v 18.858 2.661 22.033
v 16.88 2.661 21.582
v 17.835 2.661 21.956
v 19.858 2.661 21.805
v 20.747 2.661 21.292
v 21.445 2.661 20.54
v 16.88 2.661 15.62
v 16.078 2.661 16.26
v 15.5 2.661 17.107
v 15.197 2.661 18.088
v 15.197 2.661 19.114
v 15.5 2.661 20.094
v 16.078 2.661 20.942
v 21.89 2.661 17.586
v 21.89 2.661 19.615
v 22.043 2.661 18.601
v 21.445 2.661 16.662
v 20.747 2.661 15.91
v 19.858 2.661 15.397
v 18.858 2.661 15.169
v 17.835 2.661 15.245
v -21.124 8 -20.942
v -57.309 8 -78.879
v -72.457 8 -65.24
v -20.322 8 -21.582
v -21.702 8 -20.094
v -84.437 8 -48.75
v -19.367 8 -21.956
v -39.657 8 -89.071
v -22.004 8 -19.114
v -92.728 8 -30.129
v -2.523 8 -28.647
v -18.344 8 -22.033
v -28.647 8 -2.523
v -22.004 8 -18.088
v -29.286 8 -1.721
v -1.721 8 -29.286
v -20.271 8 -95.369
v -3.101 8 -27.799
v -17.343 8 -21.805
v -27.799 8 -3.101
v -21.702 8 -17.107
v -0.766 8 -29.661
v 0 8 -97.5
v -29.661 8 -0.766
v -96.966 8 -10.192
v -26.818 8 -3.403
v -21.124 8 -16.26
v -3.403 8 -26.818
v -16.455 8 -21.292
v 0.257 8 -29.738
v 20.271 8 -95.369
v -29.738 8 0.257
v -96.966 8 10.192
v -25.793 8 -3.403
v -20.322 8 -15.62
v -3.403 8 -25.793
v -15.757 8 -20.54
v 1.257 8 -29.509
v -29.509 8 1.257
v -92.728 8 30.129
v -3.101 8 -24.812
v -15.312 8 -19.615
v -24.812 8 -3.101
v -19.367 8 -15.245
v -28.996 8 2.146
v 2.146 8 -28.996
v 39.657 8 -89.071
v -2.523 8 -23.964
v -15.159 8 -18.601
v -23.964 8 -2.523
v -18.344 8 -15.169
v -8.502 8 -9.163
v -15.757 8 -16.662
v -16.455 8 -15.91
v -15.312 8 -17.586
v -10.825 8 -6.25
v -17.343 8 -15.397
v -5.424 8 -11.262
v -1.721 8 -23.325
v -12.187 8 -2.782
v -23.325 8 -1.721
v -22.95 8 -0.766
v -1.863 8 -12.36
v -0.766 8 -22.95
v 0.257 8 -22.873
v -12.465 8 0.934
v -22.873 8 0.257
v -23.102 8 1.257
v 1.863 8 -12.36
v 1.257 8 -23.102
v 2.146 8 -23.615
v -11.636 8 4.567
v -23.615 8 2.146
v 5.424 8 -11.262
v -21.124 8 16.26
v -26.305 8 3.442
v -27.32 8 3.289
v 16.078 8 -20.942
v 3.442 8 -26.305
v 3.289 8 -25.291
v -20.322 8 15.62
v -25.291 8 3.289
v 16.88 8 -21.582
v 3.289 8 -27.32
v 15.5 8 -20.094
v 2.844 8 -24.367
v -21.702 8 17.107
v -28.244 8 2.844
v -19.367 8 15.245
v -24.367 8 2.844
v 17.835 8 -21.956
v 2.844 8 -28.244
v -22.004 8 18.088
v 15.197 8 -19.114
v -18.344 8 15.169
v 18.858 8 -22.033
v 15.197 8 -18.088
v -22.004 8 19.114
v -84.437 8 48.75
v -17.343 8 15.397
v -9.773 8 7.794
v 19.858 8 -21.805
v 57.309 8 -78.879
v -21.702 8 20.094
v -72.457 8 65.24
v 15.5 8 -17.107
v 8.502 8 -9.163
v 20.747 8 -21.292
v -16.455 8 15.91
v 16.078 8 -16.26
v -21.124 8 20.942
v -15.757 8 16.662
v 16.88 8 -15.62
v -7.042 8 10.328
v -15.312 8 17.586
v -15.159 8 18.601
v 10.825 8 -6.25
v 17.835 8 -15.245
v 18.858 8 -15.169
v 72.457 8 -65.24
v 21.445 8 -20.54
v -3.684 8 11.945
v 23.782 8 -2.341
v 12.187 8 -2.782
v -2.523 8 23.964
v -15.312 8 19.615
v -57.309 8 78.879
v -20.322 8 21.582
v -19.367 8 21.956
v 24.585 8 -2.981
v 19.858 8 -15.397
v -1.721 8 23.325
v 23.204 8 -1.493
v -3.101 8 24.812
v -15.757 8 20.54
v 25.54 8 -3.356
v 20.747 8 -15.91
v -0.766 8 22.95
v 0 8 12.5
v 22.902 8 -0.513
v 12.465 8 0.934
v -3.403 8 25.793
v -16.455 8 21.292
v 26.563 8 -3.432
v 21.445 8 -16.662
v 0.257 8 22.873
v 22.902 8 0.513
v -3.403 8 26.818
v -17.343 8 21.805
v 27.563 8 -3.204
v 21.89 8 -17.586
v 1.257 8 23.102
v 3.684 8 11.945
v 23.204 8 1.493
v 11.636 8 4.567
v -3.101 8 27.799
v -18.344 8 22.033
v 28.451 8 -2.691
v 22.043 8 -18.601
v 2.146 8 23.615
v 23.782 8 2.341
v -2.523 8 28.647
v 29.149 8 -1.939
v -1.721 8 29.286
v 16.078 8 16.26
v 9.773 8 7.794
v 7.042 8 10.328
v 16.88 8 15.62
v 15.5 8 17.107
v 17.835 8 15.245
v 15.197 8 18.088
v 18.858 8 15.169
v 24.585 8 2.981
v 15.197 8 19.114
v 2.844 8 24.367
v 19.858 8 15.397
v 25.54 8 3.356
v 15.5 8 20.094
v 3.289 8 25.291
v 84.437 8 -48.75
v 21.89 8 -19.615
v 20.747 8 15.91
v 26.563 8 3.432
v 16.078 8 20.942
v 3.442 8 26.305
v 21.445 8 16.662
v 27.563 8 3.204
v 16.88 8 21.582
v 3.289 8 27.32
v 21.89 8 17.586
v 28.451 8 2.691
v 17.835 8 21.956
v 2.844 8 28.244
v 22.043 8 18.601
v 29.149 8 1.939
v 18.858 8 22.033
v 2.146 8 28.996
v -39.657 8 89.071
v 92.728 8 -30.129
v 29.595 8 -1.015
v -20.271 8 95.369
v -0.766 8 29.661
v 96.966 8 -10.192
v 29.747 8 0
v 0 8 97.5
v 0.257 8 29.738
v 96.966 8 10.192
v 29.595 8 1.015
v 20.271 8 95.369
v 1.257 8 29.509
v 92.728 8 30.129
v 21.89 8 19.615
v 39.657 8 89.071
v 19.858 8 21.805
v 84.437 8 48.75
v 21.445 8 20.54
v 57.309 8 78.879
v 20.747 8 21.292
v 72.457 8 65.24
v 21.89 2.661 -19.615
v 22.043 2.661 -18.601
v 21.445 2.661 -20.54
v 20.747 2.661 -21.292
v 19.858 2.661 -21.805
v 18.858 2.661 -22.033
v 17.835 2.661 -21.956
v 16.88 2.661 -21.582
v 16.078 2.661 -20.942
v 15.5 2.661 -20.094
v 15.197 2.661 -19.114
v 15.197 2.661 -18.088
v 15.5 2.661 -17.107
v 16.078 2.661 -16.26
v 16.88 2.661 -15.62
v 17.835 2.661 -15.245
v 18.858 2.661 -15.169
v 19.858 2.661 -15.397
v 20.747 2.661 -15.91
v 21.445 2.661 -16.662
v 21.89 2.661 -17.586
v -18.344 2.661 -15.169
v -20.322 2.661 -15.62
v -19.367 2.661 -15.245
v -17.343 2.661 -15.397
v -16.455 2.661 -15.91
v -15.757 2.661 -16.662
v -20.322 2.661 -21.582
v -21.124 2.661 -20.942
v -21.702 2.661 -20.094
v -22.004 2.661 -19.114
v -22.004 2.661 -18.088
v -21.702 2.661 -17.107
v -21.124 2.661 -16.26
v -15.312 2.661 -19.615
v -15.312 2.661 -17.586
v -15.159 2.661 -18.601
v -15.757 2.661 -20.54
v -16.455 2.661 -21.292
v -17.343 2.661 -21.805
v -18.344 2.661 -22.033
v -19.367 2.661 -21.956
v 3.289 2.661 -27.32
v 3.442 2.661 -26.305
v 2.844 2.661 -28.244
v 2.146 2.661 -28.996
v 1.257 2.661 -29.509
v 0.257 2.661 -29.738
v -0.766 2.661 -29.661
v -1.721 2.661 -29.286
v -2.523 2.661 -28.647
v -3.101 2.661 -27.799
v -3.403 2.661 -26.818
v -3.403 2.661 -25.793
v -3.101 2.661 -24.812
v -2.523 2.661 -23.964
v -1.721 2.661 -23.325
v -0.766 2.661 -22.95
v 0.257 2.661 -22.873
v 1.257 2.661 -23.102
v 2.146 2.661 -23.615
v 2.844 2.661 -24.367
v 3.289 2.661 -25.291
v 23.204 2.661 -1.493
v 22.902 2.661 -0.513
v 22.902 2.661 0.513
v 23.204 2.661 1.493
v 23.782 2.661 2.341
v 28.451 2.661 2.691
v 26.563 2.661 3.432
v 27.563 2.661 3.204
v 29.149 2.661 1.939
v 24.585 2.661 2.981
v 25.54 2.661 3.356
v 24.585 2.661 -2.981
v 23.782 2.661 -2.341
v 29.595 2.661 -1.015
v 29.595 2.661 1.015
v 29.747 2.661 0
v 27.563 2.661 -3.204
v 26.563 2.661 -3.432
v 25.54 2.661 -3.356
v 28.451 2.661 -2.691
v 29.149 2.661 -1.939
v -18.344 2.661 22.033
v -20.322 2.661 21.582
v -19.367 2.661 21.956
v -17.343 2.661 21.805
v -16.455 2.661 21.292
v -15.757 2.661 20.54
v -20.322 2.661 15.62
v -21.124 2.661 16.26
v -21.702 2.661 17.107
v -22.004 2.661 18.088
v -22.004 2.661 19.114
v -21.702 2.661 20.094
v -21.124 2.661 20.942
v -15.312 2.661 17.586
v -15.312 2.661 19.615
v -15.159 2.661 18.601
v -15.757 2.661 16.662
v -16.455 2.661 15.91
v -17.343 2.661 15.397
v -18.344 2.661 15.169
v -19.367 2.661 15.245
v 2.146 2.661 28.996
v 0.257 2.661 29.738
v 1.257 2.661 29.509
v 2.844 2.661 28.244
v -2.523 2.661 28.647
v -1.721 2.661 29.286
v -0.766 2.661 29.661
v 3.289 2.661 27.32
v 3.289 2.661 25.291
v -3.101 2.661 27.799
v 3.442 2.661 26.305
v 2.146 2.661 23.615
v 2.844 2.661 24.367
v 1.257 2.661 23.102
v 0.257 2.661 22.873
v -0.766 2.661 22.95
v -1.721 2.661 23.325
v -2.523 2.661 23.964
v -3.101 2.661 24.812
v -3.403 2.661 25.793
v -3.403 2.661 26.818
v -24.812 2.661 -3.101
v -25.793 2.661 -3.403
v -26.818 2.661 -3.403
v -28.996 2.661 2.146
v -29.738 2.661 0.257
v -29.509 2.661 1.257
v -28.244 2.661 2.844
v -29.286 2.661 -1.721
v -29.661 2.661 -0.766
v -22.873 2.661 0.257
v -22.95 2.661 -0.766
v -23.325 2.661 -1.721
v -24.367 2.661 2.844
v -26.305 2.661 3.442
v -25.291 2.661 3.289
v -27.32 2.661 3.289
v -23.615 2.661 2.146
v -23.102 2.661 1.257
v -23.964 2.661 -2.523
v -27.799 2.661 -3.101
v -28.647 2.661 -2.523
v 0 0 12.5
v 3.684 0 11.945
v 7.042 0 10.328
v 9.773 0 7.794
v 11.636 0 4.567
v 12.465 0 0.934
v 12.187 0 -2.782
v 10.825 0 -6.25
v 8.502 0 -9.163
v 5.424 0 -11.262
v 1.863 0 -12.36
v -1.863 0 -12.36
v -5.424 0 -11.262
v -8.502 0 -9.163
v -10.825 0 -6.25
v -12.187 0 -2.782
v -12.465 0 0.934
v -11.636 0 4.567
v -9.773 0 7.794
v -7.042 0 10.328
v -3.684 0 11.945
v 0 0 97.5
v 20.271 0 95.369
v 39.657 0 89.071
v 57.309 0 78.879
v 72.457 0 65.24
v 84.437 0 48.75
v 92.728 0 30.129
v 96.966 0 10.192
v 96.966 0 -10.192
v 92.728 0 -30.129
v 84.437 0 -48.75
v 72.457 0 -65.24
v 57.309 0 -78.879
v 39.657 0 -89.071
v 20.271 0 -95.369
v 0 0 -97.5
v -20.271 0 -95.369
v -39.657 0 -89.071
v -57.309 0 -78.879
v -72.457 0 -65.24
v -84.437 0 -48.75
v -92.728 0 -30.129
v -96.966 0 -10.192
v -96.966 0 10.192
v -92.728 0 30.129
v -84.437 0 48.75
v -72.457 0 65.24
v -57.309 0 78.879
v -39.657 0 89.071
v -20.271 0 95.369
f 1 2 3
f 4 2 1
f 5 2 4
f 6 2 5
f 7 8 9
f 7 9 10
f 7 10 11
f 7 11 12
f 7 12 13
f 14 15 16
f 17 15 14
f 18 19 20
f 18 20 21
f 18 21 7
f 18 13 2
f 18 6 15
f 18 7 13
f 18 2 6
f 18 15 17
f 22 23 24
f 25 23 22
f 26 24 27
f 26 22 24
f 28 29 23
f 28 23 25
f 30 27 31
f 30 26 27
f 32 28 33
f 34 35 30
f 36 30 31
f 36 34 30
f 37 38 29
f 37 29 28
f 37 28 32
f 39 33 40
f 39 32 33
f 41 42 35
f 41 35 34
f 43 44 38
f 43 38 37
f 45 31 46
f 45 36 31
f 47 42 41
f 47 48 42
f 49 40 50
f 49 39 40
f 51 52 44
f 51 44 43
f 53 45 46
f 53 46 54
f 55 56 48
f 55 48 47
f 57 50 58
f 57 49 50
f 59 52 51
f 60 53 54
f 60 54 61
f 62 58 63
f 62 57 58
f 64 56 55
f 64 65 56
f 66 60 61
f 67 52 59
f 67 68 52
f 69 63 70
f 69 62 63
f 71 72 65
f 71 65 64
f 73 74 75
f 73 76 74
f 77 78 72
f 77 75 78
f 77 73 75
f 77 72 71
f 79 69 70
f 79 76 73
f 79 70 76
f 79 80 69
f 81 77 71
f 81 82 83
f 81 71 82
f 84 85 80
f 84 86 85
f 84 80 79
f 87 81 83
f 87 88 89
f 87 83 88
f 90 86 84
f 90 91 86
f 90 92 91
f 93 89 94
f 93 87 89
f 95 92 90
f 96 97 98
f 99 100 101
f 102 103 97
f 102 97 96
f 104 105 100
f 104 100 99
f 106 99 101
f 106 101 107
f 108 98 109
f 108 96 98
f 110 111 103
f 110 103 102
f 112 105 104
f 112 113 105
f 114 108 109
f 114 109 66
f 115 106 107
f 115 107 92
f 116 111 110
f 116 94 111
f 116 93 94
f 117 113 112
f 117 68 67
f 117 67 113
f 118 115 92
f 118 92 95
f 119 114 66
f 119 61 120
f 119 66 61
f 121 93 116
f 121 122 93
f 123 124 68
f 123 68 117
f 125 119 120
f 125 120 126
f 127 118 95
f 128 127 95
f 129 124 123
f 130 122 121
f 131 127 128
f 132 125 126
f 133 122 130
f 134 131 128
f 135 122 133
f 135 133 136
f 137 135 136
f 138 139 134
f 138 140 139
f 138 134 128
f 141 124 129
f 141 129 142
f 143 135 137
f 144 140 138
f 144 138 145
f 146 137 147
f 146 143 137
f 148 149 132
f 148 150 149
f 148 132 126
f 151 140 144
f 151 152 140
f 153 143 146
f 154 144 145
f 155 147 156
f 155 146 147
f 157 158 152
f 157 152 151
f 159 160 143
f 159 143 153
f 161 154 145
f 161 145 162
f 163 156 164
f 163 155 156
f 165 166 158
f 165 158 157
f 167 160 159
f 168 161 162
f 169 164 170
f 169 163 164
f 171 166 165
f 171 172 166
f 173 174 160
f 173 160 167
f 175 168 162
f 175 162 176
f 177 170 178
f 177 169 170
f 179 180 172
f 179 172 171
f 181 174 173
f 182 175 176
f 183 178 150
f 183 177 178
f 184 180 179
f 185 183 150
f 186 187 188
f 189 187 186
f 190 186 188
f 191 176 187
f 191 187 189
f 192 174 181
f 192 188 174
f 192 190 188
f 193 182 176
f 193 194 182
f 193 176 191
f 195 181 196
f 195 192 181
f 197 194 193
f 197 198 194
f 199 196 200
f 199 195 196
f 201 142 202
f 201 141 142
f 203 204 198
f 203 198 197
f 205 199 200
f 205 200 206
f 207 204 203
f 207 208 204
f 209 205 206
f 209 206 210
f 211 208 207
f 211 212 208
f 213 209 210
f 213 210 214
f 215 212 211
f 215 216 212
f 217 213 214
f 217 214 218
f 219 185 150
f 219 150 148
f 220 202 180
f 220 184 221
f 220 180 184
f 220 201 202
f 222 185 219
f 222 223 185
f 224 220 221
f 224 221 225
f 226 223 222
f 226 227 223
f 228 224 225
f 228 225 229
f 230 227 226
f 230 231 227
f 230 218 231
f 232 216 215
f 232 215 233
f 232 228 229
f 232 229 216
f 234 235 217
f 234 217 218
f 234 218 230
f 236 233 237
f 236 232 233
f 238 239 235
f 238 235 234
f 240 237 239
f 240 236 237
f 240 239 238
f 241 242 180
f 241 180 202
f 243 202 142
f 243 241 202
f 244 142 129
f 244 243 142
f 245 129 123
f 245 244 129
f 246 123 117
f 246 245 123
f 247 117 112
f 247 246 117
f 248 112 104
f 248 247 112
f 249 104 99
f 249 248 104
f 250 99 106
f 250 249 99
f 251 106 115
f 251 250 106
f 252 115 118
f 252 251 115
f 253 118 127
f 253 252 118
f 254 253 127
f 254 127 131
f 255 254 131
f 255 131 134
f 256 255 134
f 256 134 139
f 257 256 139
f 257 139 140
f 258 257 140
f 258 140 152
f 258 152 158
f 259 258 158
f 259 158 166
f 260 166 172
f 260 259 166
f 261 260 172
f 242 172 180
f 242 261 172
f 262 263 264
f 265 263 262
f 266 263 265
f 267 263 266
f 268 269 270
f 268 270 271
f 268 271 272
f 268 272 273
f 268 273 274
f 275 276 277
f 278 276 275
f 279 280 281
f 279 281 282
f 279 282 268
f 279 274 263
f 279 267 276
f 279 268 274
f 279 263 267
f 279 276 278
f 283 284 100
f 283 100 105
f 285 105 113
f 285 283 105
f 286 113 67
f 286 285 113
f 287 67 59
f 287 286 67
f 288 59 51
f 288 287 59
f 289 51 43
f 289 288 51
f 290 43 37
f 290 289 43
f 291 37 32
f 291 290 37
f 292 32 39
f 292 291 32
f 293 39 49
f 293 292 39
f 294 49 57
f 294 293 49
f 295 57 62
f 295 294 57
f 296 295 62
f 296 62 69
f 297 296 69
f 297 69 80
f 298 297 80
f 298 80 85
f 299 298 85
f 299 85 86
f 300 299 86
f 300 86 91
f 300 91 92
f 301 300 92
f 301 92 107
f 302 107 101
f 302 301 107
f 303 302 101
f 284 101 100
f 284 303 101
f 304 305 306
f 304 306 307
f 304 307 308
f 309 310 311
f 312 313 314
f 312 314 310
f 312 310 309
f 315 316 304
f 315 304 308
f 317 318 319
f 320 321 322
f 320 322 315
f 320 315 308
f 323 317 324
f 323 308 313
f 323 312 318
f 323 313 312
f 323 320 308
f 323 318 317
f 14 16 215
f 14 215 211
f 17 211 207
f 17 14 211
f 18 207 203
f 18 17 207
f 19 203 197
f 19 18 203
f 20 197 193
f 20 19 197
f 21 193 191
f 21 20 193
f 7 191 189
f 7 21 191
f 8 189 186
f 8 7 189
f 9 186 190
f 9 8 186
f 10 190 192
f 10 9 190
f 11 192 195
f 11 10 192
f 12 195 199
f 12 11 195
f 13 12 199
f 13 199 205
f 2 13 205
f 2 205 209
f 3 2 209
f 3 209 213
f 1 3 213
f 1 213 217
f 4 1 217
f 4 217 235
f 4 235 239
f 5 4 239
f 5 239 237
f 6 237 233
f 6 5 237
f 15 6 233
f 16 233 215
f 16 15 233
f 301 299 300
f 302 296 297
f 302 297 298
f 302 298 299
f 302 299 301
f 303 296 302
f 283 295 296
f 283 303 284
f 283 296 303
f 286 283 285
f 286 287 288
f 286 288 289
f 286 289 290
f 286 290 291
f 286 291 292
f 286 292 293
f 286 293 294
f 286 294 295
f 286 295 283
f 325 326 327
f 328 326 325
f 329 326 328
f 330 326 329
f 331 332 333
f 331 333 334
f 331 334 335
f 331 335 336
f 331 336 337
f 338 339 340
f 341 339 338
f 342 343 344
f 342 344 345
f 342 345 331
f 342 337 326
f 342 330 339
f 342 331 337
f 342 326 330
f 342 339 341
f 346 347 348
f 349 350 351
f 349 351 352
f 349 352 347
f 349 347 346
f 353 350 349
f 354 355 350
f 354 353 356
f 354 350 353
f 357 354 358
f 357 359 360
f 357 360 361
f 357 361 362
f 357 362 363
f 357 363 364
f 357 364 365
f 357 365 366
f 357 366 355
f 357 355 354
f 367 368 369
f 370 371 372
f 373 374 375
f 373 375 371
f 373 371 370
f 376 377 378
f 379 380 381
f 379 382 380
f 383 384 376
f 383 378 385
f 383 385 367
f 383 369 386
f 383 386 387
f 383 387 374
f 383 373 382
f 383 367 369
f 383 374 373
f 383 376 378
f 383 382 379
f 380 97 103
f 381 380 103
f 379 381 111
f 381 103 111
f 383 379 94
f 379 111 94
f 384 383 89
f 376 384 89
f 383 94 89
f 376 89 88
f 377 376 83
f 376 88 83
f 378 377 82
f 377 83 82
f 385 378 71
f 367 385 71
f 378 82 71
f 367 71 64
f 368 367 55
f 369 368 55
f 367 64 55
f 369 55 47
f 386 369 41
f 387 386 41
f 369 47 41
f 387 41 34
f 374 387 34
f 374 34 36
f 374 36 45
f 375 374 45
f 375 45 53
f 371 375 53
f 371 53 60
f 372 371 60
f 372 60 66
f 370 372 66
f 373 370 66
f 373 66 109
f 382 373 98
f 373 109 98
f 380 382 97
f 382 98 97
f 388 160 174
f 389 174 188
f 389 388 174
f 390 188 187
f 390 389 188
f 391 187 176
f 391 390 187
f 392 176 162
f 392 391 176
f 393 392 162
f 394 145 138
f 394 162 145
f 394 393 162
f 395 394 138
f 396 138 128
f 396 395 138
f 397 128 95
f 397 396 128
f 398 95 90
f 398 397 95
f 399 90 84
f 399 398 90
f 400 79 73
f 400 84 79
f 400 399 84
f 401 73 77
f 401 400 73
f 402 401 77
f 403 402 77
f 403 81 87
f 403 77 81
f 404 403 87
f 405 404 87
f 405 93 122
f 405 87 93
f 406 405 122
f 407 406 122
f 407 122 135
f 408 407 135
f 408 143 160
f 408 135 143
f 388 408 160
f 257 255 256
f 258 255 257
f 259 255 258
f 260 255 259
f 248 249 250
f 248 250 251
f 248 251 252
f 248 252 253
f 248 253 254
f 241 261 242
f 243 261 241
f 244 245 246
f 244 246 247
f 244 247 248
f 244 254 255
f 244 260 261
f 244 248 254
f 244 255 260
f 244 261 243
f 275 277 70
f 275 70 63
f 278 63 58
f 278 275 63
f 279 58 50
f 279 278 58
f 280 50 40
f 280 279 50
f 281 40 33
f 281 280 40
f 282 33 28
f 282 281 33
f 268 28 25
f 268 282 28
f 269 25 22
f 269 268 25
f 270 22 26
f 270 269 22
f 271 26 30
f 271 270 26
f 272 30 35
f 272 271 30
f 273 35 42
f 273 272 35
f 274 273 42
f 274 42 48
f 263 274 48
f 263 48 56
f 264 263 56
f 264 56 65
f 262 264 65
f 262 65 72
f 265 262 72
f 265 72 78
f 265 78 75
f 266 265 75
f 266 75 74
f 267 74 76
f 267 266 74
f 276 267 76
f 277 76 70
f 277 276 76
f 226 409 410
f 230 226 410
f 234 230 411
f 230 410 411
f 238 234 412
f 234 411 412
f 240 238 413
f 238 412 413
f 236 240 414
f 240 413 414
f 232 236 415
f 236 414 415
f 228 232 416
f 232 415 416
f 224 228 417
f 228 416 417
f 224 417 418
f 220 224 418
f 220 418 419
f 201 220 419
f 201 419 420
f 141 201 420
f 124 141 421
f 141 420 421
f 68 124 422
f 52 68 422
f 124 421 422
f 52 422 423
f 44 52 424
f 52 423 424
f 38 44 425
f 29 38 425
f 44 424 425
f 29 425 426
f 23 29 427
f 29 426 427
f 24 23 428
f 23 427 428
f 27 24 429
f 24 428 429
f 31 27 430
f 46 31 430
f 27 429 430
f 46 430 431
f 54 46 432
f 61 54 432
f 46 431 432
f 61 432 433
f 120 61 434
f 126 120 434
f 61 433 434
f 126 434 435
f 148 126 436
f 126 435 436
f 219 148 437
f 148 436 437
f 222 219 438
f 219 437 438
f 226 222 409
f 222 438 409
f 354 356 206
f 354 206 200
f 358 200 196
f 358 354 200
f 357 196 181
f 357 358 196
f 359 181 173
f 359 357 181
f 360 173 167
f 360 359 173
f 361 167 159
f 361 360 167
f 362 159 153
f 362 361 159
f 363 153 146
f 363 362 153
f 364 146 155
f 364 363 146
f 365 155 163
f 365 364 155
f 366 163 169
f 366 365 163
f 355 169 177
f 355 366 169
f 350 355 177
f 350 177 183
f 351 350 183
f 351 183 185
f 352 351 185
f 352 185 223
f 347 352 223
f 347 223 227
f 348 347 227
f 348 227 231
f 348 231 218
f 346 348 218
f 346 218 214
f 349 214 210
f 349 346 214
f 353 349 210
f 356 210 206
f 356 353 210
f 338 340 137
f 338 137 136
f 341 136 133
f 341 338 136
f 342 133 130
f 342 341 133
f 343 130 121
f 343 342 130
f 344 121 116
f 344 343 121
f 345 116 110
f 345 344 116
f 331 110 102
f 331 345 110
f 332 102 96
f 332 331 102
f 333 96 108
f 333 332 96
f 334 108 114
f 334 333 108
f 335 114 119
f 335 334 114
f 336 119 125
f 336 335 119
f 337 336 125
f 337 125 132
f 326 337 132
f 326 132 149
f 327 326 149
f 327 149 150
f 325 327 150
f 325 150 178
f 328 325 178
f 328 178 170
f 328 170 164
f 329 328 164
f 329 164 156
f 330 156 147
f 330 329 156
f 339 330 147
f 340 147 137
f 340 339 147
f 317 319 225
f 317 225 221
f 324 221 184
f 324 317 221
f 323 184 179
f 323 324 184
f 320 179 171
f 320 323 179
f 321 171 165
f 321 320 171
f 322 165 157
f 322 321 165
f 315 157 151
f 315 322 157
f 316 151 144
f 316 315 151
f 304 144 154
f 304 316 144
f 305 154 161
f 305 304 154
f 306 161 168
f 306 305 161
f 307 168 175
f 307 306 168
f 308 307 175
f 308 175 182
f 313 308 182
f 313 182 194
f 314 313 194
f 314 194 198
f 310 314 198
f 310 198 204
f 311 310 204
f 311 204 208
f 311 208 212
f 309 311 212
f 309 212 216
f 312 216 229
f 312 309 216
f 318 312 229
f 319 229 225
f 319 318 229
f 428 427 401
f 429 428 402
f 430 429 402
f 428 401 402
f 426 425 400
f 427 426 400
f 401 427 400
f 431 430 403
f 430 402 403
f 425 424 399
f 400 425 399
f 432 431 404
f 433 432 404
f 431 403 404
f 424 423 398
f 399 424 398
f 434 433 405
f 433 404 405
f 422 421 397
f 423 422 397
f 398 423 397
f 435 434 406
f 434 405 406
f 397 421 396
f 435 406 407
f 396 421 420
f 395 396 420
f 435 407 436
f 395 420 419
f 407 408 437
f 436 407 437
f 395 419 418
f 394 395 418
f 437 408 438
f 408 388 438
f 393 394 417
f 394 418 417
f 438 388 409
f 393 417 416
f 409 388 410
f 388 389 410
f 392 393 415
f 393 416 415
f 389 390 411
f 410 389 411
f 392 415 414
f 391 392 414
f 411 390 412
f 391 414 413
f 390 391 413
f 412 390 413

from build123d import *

# Parameters (mm, degrees)
SKETCH1_R           = 97.5
BOSS_EXTRUDE1_DEPTH = 8
SKETCH2_R           = 12.5
CUT_EXTRUDE1_DEPTH  = 139.117703427
SKETCH3_R           = 3.441916601
CUT_EXTRUDE2_DEPTH  = 5.339201693
CIRPATTERN1_COUNT   = 8


with BuildPart() as part:
    # Sketch1 → Boss-Extrude1 (new body)
    with BuildSketch(Plane(origin=(0, 0, 0), x_dir=(1, 0, 0), z_dir=(0, 1, 0))):
        Circle(SKETCH1_R)
    extrude(amount=BOSS_EXTRUDE1_DEPTH)

    # Sketch2 → Cut-Extrude1 (cut, through all)
    with BuildSketch(Plane(origin=(0, 0, 0), x_dir=(1, 0, 0), z_dir=(0, 1, 0))):
        Circle(SKETCH2_R)
    extrude(amount=CUT_EXTRUDE1_DEPTH, mode=Mode.SUBTRACT)

    # Sketch3 → Cut-Extrude2 (cut)
    with BuildSketch(Plane(origin=(0, 8, 0), x_dir=(1, 0, 0), z_dir=(0, 1, 0))):
        with Locations((-26.305499443, 0)):
            Circle(SKETCH3_R)
    cut_extrude2 = extrude(amount=-CUT_EXTRUDE2_DEPTH, mode=Mode.SUBTRACT)

    # CirPattern1: Cut-Extrude2 ×8 about axis
    cirpattern1_axis = Axis((0, 0, 0), (0, 1, 0))
    for i in range(1, CIRPATTERN1_COUNT):
        add(cut_extrude2.rotate(cirpattern1_axis, i * 360 / CIRPATTERN1_COUNT), mode=Mode.SUBTRACT)


solid = part.part
